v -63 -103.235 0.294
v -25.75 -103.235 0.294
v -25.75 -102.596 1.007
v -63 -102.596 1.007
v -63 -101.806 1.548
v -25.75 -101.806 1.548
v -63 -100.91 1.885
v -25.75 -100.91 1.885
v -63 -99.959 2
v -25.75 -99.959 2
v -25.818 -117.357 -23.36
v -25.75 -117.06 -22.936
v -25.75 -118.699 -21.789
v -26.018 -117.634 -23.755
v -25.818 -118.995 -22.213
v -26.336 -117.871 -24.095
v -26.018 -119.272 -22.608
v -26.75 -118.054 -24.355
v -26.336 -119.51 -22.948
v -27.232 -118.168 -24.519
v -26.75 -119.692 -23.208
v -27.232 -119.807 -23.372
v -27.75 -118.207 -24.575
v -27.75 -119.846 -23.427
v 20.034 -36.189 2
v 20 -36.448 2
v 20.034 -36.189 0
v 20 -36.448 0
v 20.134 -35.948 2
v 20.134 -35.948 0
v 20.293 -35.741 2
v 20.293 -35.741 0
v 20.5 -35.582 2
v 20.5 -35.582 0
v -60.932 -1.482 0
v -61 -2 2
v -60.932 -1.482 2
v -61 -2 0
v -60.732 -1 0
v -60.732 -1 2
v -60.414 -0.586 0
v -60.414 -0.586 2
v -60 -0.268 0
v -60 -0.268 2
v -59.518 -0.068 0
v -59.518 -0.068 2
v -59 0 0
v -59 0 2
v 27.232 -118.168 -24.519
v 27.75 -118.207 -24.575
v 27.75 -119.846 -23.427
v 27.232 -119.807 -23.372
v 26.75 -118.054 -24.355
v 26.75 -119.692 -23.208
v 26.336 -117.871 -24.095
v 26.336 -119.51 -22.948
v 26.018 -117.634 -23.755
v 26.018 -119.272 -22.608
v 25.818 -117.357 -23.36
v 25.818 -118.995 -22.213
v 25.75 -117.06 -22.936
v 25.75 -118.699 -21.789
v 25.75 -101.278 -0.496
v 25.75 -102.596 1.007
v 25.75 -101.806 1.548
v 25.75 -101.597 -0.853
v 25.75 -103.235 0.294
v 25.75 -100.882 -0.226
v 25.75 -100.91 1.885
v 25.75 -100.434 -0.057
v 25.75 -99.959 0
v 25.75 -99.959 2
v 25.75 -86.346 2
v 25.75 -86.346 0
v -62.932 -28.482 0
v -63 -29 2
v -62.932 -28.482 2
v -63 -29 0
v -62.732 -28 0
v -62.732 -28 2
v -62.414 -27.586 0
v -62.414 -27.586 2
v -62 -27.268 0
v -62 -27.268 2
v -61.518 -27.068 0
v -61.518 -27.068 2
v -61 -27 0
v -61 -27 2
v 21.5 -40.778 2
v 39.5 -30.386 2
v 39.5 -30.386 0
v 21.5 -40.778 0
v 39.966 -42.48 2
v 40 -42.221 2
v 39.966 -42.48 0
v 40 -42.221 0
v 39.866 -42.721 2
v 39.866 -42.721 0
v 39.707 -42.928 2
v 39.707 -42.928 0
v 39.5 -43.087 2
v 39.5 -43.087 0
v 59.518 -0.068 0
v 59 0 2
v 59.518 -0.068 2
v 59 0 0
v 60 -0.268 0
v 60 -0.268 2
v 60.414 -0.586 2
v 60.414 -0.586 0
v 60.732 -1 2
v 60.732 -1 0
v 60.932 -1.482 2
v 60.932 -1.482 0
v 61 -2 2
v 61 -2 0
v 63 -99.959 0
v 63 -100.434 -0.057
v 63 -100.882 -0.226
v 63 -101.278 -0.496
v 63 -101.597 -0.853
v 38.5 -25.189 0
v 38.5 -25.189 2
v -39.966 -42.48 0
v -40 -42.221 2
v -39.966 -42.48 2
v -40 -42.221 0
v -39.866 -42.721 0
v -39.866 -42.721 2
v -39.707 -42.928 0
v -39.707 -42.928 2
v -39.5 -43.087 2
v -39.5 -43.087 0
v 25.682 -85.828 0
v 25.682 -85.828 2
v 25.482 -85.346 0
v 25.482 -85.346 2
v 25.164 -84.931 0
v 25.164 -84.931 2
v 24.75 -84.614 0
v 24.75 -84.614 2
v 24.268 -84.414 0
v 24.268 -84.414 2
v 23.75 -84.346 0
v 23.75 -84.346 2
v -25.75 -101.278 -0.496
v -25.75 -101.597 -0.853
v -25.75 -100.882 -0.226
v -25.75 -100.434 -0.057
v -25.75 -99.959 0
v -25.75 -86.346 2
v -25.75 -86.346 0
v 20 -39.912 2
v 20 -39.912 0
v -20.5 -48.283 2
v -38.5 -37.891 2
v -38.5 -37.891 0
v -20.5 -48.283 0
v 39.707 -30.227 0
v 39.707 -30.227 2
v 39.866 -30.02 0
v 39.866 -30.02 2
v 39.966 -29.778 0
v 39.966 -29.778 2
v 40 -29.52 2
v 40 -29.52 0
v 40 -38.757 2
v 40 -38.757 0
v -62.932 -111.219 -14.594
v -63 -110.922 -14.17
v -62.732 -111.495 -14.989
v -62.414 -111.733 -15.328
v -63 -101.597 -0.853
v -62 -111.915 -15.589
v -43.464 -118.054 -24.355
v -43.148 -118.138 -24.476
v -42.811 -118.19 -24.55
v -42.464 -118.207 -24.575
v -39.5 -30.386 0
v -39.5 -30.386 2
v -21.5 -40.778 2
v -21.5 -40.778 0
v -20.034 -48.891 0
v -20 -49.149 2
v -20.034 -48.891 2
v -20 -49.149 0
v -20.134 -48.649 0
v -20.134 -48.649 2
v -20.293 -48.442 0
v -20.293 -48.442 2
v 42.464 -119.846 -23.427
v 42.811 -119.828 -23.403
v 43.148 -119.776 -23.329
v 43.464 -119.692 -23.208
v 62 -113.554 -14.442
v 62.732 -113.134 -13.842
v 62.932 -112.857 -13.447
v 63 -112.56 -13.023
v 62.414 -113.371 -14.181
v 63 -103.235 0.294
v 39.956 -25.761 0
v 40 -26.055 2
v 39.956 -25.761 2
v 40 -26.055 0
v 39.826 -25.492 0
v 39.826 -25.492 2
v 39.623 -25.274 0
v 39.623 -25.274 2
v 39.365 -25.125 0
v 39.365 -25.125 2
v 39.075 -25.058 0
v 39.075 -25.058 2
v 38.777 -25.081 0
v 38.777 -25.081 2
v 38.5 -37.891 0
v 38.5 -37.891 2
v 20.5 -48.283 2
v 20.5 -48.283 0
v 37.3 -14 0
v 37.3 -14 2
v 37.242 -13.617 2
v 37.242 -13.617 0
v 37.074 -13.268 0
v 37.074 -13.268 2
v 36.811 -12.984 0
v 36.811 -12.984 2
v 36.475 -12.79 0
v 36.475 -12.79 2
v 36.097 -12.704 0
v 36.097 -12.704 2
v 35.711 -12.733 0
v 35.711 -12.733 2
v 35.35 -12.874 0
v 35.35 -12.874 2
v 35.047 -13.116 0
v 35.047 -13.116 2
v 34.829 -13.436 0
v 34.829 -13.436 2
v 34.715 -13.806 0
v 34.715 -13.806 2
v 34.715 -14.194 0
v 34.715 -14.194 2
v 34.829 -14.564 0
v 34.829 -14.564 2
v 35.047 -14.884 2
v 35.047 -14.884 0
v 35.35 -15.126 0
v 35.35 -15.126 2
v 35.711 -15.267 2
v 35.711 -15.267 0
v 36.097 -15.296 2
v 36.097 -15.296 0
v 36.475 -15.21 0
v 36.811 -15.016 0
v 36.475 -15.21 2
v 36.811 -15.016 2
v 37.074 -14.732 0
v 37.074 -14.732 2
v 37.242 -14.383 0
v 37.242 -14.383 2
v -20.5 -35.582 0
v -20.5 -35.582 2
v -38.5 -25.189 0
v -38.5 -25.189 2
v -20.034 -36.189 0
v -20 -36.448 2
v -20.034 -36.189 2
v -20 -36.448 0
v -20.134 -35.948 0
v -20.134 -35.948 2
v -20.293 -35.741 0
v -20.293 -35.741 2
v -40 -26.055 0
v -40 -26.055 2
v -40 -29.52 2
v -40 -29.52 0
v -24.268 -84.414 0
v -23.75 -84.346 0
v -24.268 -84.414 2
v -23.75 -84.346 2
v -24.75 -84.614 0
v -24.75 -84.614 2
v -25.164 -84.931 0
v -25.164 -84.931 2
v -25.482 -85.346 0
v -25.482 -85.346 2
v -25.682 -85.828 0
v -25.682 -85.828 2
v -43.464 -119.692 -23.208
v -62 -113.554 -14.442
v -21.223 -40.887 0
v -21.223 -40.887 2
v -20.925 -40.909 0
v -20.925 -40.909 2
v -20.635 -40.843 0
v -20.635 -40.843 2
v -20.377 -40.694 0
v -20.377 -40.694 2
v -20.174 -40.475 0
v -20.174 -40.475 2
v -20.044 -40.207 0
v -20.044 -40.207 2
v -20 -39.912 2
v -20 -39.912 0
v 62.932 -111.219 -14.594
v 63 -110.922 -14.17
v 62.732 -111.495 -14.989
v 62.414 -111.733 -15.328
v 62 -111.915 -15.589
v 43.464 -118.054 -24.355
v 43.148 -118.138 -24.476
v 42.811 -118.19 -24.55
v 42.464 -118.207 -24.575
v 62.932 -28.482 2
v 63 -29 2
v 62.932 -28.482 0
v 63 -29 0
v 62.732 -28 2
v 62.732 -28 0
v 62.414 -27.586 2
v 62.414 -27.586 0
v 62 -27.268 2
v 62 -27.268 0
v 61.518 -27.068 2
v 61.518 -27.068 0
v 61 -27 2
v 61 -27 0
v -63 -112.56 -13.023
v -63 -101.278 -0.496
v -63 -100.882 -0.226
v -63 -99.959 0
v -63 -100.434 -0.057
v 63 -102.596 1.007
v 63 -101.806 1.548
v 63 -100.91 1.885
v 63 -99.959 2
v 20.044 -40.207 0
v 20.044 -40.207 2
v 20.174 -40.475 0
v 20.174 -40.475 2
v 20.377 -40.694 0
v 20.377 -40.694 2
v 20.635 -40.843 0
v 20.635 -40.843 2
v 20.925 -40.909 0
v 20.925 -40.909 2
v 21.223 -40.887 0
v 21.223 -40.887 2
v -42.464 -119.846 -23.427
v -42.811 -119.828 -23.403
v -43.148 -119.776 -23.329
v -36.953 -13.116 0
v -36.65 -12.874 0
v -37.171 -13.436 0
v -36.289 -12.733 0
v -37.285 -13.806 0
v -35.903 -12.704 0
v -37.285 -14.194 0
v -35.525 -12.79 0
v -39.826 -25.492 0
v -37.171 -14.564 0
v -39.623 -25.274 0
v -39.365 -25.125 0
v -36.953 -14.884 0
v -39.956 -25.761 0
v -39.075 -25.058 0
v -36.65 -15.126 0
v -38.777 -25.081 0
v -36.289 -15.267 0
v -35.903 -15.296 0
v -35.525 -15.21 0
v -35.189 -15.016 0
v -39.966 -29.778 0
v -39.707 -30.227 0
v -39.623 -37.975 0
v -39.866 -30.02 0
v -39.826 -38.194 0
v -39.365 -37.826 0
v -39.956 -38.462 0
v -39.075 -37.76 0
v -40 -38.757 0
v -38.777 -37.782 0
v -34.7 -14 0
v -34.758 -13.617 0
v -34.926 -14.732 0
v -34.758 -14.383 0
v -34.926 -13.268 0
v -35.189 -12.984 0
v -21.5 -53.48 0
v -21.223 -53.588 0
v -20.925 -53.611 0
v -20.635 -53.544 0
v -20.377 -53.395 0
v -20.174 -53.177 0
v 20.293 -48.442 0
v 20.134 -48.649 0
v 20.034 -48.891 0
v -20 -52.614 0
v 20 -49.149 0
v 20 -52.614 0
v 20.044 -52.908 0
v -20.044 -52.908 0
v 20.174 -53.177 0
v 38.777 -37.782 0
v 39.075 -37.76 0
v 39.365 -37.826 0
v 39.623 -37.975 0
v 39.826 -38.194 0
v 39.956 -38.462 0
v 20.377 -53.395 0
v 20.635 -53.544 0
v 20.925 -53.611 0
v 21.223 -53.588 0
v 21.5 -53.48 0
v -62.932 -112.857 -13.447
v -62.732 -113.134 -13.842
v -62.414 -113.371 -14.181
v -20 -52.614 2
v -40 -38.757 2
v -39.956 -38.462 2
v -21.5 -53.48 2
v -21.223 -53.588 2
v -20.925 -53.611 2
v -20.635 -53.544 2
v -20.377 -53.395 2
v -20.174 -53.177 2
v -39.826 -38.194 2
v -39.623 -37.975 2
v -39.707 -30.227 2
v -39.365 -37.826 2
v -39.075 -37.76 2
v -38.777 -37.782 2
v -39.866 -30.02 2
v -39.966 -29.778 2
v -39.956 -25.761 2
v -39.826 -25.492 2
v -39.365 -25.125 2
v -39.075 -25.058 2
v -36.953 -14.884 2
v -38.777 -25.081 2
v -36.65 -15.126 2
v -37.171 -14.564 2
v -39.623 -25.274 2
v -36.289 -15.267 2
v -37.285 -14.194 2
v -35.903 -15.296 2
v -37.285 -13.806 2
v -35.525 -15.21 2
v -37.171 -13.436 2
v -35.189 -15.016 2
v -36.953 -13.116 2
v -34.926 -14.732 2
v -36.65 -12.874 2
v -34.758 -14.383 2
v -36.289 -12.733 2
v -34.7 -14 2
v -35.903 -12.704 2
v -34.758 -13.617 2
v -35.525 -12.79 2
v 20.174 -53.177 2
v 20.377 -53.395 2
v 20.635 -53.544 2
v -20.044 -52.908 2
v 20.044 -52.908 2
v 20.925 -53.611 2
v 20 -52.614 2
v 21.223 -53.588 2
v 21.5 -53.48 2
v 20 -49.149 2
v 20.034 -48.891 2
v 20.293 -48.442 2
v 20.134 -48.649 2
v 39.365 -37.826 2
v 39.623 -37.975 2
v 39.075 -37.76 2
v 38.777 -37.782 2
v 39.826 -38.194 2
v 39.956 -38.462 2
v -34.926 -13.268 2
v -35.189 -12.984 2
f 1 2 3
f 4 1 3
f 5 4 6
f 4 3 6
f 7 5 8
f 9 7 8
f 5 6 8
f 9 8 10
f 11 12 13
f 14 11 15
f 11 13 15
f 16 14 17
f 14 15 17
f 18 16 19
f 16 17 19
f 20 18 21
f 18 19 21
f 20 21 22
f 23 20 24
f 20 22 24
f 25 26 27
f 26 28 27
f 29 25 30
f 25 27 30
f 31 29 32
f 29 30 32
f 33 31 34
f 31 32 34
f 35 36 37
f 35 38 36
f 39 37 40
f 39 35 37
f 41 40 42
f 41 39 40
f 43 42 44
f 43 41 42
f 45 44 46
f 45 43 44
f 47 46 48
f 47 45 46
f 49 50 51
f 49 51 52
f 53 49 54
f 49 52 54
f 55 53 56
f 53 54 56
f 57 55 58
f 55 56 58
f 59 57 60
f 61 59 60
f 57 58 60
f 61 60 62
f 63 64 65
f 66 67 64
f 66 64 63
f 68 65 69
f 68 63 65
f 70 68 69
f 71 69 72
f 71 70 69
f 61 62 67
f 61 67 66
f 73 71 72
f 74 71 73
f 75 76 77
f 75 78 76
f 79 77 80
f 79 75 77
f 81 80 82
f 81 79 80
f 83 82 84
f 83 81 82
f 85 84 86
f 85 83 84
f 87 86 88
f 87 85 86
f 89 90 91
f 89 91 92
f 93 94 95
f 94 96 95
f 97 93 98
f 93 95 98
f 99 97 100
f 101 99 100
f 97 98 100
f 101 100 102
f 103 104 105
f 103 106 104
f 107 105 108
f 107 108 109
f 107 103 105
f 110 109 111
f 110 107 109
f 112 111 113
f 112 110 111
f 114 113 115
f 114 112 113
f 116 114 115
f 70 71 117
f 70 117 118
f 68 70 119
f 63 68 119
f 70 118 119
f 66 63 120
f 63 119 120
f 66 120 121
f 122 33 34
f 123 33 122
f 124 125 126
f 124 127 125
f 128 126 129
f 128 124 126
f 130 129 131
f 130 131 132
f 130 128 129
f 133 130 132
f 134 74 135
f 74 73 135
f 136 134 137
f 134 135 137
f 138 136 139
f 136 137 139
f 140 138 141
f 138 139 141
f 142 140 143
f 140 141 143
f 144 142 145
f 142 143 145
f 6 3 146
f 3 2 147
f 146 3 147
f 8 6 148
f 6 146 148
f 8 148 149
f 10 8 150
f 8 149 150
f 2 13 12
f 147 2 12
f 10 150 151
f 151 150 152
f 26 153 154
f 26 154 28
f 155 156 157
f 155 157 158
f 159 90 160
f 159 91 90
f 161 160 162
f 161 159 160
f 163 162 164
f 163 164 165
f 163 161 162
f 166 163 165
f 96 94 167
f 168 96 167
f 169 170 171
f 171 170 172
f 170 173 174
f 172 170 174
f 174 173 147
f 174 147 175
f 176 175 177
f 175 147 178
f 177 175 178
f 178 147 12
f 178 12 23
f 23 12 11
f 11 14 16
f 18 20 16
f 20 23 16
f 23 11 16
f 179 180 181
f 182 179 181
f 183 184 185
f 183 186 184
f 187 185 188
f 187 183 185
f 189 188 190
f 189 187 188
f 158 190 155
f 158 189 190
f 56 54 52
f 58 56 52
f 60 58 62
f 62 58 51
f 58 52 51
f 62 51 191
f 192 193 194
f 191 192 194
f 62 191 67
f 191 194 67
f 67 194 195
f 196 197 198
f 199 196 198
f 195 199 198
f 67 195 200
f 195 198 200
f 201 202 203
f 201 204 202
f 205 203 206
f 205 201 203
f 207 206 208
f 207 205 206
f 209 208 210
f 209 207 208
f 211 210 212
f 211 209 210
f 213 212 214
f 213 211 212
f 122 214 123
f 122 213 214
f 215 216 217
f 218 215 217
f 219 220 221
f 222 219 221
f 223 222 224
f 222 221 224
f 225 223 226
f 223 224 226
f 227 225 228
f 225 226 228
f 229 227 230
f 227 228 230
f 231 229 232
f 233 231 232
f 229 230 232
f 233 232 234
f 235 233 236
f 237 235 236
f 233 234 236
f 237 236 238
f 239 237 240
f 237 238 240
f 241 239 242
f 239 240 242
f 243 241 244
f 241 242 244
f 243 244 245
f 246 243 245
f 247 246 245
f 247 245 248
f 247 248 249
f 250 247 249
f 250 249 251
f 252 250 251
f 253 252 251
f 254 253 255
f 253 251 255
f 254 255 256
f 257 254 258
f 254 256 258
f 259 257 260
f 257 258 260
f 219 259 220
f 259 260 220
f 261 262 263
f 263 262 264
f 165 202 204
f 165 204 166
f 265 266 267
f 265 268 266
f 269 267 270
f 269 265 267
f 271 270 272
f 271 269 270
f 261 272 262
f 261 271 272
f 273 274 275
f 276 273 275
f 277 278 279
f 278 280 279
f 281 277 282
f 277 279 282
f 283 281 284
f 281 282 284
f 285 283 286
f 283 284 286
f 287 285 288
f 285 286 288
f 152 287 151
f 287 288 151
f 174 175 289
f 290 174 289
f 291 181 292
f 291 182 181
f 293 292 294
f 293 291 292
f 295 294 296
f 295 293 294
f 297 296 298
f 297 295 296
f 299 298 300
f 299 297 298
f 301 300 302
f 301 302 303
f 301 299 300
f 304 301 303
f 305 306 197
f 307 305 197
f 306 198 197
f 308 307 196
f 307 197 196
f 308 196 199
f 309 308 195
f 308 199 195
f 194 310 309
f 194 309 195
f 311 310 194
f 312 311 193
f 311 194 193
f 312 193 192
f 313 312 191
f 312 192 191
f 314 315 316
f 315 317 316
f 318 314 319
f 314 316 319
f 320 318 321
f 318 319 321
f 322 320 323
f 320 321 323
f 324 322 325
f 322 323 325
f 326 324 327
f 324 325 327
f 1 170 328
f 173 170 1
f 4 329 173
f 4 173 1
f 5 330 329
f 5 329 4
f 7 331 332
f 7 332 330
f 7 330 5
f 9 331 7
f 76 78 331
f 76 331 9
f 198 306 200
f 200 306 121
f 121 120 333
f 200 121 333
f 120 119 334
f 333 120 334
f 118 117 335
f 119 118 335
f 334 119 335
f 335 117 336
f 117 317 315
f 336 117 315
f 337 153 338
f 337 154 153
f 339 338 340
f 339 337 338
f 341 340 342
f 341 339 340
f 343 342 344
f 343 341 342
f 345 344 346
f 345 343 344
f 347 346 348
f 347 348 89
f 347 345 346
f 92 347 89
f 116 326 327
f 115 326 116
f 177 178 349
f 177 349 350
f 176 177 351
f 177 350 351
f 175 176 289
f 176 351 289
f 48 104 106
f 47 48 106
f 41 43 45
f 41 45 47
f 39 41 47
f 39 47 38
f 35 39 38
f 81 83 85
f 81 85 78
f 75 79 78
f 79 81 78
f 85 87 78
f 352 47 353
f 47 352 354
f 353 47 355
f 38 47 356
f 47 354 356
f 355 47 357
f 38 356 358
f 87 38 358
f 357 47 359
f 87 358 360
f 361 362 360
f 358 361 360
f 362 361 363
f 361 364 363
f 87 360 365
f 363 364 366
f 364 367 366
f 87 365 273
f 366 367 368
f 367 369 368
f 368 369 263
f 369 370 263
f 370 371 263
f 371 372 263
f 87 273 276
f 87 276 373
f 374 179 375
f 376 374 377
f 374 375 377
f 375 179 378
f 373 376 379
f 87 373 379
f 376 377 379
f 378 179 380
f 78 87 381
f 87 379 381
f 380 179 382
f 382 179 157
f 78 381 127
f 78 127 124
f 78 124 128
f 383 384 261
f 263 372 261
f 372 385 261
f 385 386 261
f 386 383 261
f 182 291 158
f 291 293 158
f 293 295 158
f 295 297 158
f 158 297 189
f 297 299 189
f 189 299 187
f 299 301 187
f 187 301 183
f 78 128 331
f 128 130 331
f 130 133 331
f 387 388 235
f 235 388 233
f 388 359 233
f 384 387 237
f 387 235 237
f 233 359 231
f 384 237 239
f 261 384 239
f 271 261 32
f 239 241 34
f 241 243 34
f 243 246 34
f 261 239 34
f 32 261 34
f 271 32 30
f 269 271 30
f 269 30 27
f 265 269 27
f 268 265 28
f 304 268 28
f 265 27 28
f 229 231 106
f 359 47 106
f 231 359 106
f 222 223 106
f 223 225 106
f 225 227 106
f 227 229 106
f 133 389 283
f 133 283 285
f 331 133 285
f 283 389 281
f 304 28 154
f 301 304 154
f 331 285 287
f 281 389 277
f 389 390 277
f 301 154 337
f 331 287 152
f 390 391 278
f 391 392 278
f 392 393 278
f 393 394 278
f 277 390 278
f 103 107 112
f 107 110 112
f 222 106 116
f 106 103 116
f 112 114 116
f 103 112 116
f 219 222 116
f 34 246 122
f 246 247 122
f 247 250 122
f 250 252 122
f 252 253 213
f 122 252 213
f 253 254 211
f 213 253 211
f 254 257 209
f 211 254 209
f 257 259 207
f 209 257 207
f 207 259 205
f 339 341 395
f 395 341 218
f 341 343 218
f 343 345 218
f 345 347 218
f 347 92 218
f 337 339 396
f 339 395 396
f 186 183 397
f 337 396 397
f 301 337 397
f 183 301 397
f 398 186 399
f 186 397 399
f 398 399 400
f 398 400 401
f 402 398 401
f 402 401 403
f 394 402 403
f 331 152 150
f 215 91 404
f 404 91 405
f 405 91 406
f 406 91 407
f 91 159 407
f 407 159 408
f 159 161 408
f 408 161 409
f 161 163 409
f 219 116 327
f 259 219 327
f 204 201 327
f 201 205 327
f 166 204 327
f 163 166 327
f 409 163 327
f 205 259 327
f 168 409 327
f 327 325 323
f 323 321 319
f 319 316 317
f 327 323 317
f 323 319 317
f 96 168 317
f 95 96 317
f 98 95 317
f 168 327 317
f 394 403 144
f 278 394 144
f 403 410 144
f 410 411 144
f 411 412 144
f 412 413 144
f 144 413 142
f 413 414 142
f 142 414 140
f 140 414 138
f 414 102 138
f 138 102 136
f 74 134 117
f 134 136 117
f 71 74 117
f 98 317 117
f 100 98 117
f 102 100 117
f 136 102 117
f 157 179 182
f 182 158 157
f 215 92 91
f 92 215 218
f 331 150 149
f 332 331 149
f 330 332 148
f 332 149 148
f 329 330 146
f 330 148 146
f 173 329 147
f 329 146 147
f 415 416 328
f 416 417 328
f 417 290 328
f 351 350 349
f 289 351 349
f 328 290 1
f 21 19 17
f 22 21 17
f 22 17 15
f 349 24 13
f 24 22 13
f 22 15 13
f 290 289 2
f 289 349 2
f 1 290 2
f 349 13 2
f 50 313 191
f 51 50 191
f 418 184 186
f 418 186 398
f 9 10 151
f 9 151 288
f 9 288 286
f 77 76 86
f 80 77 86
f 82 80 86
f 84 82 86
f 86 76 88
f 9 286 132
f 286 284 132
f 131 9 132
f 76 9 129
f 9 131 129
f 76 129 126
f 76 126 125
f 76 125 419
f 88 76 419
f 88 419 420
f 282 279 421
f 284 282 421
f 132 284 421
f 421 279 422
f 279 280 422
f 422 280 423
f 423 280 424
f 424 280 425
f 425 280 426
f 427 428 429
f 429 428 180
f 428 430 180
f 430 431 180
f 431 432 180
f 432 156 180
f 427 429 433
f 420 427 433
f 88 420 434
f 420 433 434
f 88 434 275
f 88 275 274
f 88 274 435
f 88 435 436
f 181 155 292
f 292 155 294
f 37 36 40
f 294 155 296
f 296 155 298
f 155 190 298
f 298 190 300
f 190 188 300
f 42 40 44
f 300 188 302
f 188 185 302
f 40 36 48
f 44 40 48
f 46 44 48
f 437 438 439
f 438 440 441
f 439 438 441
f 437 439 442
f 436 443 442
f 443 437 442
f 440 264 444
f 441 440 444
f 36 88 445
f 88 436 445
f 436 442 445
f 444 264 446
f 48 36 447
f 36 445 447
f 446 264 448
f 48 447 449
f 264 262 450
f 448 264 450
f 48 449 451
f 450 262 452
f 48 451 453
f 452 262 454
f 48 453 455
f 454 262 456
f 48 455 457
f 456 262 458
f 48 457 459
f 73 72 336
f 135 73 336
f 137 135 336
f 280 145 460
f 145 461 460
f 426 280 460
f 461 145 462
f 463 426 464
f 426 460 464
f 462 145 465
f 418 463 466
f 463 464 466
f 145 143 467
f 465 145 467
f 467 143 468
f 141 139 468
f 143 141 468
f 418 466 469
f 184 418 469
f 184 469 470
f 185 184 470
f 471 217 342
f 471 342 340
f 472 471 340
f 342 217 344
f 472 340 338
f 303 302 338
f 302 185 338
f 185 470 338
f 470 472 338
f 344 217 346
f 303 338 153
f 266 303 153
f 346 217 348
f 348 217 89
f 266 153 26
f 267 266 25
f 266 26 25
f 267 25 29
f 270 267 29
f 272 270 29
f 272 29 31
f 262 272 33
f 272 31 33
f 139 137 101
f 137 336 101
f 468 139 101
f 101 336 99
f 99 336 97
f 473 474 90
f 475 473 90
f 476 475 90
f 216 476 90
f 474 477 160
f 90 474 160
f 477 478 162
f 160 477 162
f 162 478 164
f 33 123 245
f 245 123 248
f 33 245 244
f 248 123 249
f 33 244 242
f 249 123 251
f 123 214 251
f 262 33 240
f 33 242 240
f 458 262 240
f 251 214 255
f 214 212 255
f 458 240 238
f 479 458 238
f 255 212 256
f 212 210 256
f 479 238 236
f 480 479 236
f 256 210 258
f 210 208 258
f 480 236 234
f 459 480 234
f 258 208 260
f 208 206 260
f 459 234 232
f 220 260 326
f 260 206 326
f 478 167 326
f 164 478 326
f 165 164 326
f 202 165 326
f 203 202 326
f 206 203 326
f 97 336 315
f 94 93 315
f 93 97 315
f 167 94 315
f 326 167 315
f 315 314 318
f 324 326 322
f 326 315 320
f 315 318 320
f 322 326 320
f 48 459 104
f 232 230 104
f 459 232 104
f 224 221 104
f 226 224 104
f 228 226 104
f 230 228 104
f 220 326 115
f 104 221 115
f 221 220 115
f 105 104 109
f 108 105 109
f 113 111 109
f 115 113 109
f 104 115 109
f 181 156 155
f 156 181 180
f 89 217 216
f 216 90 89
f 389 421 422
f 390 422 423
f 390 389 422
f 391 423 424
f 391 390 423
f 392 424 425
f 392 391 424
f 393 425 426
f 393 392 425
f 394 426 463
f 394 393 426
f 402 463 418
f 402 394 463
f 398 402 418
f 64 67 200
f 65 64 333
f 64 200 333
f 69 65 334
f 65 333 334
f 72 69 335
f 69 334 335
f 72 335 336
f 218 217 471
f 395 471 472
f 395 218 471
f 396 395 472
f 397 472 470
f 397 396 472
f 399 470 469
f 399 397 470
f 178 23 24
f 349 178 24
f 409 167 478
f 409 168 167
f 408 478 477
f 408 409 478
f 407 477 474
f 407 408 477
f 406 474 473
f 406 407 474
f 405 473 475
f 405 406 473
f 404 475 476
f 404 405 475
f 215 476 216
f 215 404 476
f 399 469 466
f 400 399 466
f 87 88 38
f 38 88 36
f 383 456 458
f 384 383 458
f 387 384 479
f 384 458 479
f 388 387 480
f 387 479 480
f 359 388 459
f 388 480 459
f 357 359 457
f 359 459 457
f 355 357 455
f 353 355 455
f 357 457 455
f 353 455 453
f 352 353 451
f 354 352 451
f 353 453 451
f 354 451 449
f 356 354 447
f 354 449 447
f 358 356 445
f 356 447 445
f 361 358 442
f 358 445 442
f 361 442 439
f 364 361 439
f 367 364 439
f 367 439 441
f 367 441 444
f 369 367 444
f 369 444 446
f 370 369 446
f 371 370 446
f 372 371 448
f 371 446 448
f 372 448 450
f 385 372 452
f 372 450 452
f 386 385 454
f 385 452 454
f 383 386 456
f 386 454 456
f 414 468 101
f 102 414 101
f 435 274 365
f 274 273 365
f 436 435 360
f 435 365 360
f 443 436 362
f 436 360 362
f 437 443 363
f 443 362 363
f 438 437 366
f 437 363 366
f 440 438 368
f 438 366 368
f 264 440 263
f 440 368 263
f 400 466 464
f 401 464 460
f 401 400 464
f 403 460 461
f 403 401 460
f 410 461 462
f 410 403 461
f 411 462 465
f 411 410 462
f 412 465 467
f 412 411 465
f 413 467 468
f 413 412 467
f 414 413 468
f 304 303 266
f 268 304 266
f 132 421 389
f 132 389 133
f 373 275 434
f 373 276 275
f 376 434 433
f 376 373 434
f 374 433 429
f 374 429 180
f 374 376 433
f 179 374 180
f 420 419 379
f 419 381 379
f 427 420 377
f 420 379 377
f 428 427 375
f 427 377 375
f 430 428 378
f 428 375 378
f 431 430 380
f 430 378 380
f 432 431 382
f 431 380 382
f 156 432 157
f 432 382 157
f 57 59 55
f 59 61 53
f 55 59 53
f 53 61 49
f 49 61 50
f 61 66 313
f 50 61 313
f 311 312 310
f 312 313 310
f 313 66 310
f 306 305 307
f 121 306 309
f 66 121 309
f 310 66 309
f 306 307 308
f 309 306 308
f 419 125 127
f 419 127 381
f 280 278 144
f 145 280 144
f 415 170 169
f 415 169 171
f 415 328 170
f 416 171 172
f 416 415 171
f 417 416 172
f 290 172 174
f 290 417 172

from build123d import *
from OCP.BRepFilletAPI import BRepFilletAPI_MakeChamfer

# Parameters (mm, degrees)
BASE_FLANGE1_DEPTH      = 63
CUT_EXTRUDE1_DEPTH      = 138.978891404
CUT_EXTRUDE1_DEPTH_BACK = 138.978891404
SKETCH2_W               = 51.5
SKETCH2_H               = 35.5
FILLET1_R               = 2
CHAMFER1_SIZE           = 20
CHAMFER1_SIZE2          = 11.547005384
SKETCH3_R               = 1.3
CUT_EXTRUDE2_DEPTH      = 2
SKETCH4_W               = 2
SKETCH4_H               = 27
CUT_EXTRUDE3_DEPTH      = 2
FILLET2_R               = 2
CUT_EXTRUDE4_DEPTH      = 10
FILLET3_R               = 1


# Sheet-metal steps are written as plain solids
with BuildPart() as part:
    # Sketch1 → Base-Flange1 (new, symmetric)
    with BuildSketch(Plane(origin=(0, 0, 0), x_dir=(0, 0, -1), z_dir=(1, 0, 0))):
        with BuildLine():
            Line((0, 0), (0, -99.958865899))
            ThreePointArc((0, -99.958865899), (0.225978334, -100.882363125), (0.852847127, -101.597169987))
            Line((0.852847127, -101.597169987), (24.574561329, -118.207293091))
            Line((24.574561329, -118.207293091), (23.427408456, -119.845597179))
            Line((23.427408456, -119.845597179), (-0.294305745, -103.235474076))
            ThreePointArc((-0.294305745, -103.235474076), (-1.548043333, -101.805860352), (-2, -99.958865899))
            Line((-2, -99.958865899), (-2, 0))
            Line((-2, 0), (0, 0))
        make_face()
    extrude(amount=BASE_FLANGE1_DEPTH, both=True)

    # Sketch2 → Cut-Extrude1 (cut, two sides: drawn at the far end of the back side and taken through both)
    with BuildSketch(Plane.XY.offset(2).offset(-CUT_EXTRUDE1_DEPTH_BACK)):
        with Locations((0, -102.095597179)):
            Rectangle(SKETCH2_W, SKETCH2_H)
    extrude(amount=CUT_EXTRUDE1_DEPTH + CUT_EXTRUDE1_DEPTH_BACK, mode=Mode.SUBTRACT)

    # Fillet1
    fillet1_edges = [part.edges().sort_by_distance(p)[0] for p in [
        (-25.75, -84.345597179, 1),
        (25.75, -84.345597179, 1),
    ]]
    fillet(fillet1_edges, radius=FILLET1_R)

    # Chamfer1: one chamfer whose edges measure the first distance from different faces: ONE call of the kernel's chamfer builder (chamfer() names one face for all edges)
    chamfer1_edges_1 = [part.edges().sort_by_distance(p)[0] for p in [
        (63, -119.026445135, -24.000984892),
    ]]
    chamfer1_side_1 = [part.faces().sort_by_distance(p)[0] for p in [
        (44.375, -119.026445135, -24.000984892),
    ]]
    chamfer1_edges_2 = [part.edges().sort_by_distance(p)[0] for p in [
        (-63, -119.026445135, -24.000984892),
    ]]
    chamfer1_side_2 = [part.faces().sort_by_distance(p)[0] for p in [
        (-44.375, -119.026445135, -24.000984892),
    ]]
    chamfer1 = BRepFilletAPI_MakeChamfer(part.part.solid().wrapped)
    for e in chamfer1_edges_1:
        chamfer1.Add(CHAMFER1_SIZE, CHAMFER1_SIZE2, e.wrapped, chamfer1_side_1[0].wrapped)  # the first distance lies on this face
    for e in chamfer1_edges_2:
        chamfer1.Add(CHAMFER1_SIZE, CHAMFER1_SIZE2, e.wrapped, chamfer1_side_2[0].wrapped)  # the first distance lies on this face
    add(Compound.cast(chamfer1.Shape()), mode=Mode.REPLACE)

    # Sketch3 → Cut-Extrude2 (cut)
    with BuildSketch(Plane.XY.offset(2)):
        with Locations((-36, -14)):
            Circle(SKETCH3_R)
        with Locations((36, -14)):
            Circle(SKETCH3_R)
    extrude(amount=-CUT_EXTRUDE2_DEPTH, mode=Mode.SUBTRACT)

    # Sketch4 → Cut-Extrude3 (cut)
    with BuildSketch(Plane.XY.offset(2)):
        with Locations((-62, -13.5)):
            Rectangle(SKETCH4_W, SKETCH4_H)
        with Locations((62, -13.5)):
            Rectangle(SKETCH4_W, SKETCH4_H)
    extrude(amount=-CUT_EXTRUDE3_DEPTH, mode=Mode.SUBTRACT)

    # Fillet2
    fillet2_edges = [part.edges().sort_by_distance(p)[0] for p in [
        (63, -112.403354936, -14.542231827),
        (43, -119.026445135, -24.000984892),
        (25.75, -119.026445135, -24.000984892),
        (-63, -112.403354936, -14.542231827),
        (-43, -119.026445135, -24.000984892),
        (-25.75, -119.026445135, -24.000984892),
        (-63, -27, 1),
        (63, -27, 1),
        (61, 0, 1),
        (-61, 0, 1),
    ]]
    fillet(fillet2_edges, radius=FILLET2_R - 0.0001)  # a hair under: the kernel refuses the full size

    # Sketch5 → Cut-Extrude4 (cut)
    with BuildSketch(Plane.XY.offset(2)):
        Polygon((-40, -24.323383181), (-40, -30.096885873), (-20, -41.643891257), (-20, -35.870388565), align=None)
        Polygon((-40, -37.025089103), (-20, -48.572094487), (-20, -54.345597179), (-40, -42.798591795), align=None)
        Polygon((40, -42.798591795), (40, -37.025089103), (20, -48.572094487), (20, -54.345597179), align=None)
        Polygon((20, -35.870388565), (40, -24.323383181), (40, -30.096885873), (20, -41.643891257), align=None)
    extrude(amount=-CUT_EXTRUDE4_DEPTH, mode=Mode.SUBTRACT)

    # Fillet3
    fillet3_edges = [part.edges().sort_by_distance(p)[0] for p in [
        (-40, -42.798591795, 1),
        (-40, -37.025089103, 1),
        (-20, -48.572094487, 1),
        (-20, -54.345597179, 1),
        (40, -42.798591795, 1),
        (20, -54.345597179, 1),
        (20, -48.572094487, 1),
        (40, -37.025089103, 1),
        (20, -41.643891257, 1),
        (20, -35.870388565, 1),
        (40, -24.323383181, 1),
        (40, -30.096885873, 1),
        (-40, -24.323383181, 1),
        (-20, -35.870388565, 1),
        (-20, -41.643891257, 1),
        (-40, -30.096885873, 1),
    ]]
    fillet(fillet3_edges, radius=FILLET3_R)


solid = part.part
